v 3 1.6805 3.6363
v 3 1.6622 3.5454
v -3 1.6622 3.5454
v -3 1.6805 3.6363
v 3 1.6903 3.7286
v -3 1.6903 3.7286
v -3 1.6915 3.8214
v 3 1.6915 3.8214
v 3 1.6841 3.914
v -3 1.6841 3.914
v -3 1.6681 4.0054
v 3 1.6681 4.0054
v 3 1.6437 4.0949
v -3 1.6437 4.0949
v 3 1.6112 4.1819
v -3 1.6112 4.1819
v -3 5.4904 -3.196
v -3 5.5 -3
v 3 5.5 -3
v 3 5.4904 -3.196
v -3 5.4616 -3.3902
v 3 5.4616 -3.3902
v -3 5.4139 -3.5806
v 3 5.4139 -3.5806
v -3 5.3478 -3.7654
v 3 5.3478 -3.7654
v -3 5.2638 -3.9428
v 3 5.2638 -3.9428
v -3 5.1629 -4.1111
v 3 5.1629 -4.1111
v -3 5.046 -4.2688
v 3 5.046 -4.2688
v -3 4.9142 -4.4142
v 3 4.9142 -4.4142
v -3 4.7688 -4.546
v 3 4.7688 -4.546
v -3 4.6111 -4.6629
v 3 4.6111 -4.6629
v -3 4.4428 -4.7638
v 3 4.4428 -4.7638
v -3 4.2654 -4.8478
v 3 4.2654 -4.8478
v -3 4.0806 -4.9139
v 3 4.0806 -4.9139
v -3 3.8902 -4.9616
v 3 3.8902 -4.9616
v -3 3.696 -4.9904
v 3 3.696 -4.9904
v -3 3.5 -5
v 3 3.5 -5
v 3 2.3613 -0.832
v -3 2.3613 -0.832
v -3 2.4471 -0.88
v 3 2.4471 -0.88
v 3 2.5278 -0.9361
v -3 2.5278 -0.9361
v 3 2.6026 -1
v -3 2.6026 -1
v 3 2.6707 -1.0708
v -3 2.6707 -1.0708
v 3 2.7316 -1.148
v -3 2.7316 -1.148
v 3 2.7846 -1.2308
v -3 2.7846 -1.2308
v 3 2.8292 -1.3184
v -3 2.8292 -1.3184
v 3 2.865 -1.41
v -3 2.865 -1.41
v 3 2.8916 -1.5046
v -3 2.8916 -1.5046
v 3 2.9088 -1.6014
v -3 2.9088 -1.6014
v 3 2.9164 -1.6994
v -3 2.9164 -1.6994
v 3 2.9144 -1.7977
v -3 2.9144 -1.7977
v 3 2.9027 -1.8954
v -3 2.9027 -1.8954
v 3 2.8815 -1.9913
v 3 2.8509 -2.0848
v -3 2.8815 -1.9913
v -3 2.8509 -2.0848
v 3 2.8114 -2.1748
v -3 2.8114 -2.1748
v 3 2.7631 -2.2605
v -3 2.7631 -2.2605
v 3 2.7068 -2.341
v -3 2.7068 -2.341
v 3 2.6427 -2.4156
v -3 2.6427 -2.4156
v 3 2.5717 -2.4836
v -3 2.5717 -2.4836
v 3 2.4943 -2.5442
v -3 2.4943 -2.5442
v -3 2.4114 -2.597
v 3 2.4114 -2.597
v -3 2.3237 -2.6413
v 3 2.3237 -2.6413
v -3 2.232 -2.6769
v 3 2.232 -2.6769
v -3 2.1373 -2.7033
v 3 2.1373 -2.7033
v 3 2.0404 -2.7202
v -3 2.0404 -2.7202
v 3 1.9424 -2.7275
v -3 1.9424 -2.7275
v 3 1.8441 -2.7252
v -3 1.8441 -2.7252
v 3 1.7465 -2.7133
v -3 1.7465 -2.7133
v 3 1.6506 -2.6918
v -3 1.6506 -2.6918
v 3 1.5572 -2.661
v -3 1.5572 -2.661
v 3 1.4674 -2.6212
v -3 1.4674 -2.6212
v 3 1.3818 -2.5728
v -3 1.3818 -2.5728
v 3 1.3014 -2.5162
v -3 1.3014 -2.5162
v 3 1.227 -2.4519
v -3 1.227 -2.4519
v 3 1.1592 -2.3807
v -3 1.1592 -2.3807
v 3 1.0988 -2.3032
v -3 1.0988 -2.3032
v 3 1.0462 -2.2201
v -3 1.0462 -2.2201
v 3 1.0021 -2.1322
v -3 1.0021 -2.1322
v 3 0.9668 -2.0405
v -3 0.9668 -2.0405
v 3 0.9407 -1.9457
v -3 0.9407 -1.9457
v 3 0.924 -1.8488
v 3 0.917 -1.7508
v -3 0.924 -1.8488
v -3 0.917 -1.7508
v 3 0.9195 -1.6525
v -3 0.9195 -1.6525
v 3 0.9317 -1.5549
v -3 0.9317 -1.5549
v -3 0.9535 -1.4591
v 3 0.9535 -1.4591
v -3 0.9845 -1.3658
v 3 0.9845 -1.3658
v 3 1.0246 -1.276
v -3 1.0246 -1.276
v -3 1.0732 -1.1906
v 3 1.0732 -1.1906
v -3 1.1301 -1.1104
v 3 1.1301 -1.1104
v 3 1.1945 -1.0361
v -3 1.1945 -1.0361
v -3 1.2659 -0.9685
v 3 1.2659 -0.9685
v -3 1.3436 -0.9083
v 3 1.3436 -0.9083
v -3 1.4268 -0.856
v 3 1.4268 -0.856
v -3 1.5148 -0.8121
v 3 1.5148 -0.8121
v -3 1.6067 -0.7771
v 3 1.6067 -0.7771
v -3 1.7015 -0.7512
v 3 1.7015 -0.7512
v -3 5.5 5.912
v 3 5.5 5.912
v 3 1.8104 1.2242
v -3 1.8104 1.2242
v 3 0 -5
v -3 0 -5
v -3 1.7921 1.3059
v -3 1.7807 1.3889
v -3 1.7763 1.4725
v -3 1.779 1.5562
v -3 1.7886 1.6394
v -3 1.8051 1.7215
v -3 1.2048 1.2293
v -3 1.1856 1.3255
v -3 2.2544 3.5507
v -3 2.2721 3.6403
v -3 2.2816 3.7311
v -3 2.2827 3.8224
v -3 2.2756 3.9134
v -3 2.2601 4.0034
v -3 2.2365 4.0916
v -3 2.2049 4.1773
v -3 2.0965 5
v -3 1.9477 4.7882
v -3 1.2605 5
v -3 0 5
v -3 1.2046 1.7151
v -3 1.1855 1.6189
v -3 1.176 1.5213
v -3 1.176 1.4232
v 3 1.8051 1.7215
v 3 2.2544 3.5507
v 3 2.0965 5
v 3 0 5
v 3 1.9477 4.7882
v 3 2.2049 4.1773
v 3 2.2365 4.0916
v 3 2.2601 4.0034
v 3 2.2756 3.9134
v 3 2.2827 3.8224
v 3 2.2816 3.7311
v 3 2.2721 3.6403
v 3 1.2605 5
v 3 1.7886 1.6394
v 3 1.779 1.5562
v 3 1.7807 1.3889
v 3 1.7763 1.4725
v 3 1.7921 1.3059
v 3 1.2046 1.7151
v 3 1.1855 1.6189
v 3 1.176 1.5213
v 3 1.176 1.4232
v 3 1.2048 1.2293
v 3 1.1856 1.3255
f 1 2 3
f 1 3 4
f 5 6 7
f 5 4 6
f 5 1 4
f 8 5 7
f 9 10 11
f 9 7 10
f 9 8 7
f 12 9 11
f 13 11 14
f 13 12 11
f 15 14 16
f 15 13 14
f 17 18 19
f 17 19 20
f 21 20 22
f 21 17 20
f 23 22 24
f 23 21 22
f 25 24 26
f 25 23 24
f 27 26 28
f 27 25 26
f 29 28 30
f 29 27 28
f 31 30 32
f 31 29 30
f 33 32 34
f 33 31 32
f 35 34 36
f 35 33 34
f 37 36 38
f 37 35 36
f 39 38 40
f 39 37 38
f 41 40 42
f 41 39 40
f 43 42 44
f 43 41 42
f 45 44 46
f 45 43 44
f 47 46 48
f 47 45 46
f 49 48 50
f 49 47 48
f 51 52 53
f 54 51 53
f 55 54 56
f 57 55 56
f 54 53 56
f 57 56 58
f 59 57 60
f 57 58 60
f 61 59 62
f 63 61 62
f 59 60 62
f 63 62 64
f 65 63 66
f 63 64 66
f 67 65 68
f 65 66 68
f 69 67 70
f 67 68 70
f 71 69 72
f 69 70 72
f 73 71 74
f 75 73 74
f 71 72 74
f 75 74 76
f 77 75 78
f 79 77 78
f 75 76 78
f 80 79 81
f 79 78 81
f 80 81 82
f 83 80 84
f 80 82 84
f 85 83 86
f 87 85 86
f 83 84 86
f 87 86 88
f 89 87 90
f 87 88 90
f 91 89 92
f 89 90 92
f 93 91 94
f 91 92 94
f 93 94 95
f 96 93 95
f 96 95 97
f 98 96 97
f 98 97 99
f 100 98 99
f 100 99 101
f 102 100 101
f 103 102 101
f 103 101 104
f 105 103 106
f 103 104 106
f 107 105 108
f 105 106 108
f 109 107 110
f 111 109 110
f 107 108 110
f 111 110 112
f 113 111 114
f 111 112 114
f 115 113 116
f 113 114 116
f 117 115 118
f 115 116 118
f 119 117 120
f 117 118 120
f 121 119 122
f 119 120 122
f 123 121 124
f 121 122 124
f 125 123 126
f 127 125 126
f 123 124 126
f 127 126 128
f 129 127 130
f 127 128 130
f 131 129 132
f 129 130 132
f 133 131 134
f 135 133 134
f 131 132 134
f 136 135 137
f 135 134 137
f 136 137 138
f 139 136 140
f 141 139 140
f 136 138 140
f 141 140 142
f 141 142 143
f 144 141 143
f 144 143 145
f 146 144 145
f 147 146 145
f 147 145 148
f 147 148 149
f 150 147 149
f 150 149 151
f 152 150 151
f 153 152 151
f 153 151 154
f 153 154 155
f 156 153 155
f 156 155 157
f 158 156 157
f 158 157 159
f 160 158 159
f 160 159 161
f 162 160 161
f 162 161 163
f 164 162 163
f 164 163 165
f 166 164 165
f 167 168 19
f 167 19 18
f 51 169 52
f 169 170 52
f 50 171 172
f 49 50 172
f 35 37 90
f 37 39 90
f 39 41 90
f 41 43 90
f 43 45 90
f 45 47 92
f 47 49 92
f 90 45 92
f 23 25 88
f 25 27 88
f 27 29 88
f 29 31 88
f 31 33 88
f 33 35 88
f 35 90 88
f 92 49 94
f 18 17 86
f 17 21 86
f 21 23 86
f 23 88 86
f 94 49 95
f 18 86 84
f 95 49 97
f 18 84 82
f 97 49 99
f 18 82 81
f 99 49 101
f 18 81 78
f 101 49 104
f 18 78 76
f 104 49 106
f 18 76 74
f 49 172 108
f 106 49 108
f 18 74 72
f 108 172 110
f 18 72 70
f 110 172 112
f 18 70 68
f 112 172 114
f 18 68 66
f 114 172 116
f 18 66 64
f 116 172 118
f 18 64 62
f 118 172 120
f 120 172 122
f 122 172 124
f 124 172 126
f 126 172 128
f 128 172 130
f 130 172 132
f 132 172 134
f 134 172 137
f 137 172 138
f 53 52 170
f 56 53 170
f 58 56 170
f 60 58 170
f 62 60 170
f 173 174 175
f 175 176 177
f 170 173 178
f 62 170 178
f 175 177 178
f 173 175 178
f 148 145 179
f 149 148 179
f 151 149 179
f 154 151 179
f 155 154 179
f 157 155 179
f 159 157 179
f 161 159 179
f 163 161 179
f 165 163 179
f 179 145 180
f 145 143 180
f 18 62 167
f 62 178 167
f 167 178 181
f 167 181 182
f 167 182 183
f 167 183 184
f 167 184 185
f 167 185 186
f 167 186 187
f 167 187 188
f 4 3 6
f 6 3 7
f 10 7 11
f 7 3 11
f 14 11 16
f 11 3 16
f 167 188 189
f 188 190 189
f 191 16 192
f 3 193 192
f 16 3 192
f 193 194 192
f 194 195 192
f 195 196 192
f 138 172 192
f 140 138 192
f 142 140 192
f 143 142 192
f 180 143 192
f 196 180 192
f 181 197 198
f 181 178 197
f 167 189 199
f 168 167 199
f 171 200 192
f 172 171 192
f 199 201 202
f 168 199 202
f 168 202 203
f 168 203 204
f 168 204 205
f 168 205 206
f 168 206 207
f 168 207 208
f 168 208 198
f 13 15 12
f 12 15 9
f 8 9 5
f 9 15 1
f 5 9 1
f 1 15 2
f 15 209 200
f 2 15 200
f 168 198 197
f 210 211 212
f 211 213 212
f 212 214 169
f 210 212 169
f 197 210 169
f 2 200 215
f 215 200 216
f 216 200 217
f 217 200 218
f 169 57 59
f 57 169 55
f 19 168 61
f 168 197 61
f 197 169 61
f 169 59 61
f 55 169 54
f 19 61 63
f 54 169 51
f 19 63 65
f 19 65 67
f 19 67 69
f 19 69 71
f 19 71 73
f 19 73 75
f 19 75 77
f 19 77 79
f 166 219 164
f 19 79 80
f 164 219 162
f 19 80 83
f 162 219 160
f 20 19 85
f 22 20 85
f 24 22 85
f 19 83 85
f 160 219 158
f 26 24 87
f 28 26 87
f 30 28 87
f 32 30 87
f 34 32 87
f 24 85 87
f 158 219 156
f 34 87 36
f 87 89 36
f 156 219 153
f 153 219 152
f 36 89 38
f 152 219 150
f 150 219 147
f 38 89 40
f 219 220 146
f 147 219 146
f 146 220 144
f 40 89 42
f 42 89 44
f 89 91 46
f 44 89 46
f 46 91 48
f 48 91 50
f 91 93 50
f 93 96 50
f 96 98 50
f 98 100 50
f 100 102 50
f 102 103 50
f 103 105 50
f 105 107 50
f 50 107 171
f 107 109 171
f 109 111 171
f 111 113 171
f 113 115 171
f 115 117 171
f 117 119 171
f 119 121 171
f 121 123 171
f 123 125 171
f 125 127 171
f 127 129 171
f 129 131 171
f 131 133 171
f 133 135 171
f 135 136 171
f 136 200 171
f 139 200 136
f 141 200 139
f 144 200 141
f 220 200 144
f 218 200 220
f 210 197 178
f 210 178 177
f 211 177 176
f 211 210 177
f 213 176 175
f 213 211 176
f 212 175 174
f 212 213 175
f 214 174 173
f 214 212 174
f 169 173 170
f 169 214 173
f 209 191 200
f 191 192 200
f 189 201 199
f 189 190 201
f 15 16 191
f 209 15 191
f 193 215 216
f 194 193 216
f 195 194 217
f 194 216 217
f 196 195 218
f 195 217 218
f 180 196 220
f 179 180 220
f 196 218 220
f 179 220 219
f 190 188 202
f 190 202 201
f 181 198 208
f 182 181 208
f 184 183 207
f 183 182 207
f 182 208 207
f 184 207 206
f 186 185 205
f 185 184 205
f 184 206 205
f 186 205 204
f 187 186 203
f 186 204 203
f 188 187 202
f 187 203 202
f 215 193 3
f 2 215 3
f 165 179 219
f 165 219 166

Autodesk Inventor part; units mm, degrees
ref_plane "YZ Plane" through (0, 0, 0) normal (1, 0, 0) x (0, 1, 0)
ref_plane "XZ Plane" through (0, 0, 0) normal (0, 1, 0) x (-1, 0, 0)
ref_plane "XY Plane" through (0, 0, 0) normal (0, 0, 1) x (1, 0, 0)
sketch "Sketch1" plane through (0, 0, 0) normal (0, 1, 0) x (-1, 0, 0)
  line L0 (3, 5) -> (-3, 5)
  line L1 (-3, 5) -> (-3, -5)
  line L2 (-3, -5) -> (3, -5)
  line L3 (3, -5) -> (3, 5)
  line L4 (3, 5) -> (-3, -5) construction
  line L5 (-3, 5) -> (3, -5) construction
  point P0 (0, 0)
  dimension "d0" = 6
  dimension "d1" = 10
extrude "Extrusion1" add sketch "Sketch1" along normal blind 5.5
sketch "Sketch2" plane through (-3, 0, -5) normal (-1, 0, 0) x (0, 0, 1)
  line L0 (0, 0) -> (0, 5.5) projected
  line L1 (0, 5.5) -> (10, 5.5) projected
  line L2 (5, 0) -> (6.2, 0)
  line L3 (0, 0) -> (10, 0) projected
  line L4 (6.2, 0) -> (7.4, 0)
  line L5 (7.4, 0) -> (8.6, 0)
  line L6 (6.4722, 1.7439) -> (8.8722, 2.3334)
  line L7 (8.8722, 2.3334) -> (9.7882, 1.9477)
  line L8 (6.4722, 1.7439) -> (6.4722, 1.1439)
  line L9 (6.4722, 1.1439) -> (4.2488, 1.7015)
  line L10 (6.4722, 1.1439) -> (8.8722, 1.7439)
  line L11 (8.8722, 1.7439) -> (10, 1.2605)
  arc A0 (4.168, 2.3613) -> (4.2488, 1.7015) centre (3.2722, 1.9167) ccw
  line L12 (6.4722, 1.7439) -> (4.168, 2.3613)
  line L13 (6.4722, 1.7439) -> (8.8578, 1.7439) construction
  line L14 (9.7882, 1.9477) -> (10, 2.0965)
  line L15 (10, 0) -> (10, 5.5) projected
  line L16 (10, 2.0965) -> (10, 1.2605)
  point P0 (10.2722, 1.9167)
  dimension "d8" = 1.2
  dimension "d9" = 1.2
  dimension "d10" = 1.2
  dimension "d17" = 0.6
  dimension "d19" = 2
  dimension "d20" = 165
extrude "Extrusion2" cut sketch "Sketch2" against normal blind 6.5 contours L15 L11 L10 L8 L6 L7 L14 | L8 L9 A0 L12
fillet "Fillet2" radius 2 1 edges at (0, 5.5, -5)
fillet "Fillet3" radius 1 4 edges at (0, 1.7439, 3.8722) (0, 1.7439, 1.4722) (0, 1.1439, 1.4722) (0, 2.3334, 3.8722)
draft "FaceDraft2" angle 15 pull direction (0, -1, 0) faces at (-1, 3.231, 5) fixed edges at (0, 2.0965, 5)
properties part number "BagClip"
